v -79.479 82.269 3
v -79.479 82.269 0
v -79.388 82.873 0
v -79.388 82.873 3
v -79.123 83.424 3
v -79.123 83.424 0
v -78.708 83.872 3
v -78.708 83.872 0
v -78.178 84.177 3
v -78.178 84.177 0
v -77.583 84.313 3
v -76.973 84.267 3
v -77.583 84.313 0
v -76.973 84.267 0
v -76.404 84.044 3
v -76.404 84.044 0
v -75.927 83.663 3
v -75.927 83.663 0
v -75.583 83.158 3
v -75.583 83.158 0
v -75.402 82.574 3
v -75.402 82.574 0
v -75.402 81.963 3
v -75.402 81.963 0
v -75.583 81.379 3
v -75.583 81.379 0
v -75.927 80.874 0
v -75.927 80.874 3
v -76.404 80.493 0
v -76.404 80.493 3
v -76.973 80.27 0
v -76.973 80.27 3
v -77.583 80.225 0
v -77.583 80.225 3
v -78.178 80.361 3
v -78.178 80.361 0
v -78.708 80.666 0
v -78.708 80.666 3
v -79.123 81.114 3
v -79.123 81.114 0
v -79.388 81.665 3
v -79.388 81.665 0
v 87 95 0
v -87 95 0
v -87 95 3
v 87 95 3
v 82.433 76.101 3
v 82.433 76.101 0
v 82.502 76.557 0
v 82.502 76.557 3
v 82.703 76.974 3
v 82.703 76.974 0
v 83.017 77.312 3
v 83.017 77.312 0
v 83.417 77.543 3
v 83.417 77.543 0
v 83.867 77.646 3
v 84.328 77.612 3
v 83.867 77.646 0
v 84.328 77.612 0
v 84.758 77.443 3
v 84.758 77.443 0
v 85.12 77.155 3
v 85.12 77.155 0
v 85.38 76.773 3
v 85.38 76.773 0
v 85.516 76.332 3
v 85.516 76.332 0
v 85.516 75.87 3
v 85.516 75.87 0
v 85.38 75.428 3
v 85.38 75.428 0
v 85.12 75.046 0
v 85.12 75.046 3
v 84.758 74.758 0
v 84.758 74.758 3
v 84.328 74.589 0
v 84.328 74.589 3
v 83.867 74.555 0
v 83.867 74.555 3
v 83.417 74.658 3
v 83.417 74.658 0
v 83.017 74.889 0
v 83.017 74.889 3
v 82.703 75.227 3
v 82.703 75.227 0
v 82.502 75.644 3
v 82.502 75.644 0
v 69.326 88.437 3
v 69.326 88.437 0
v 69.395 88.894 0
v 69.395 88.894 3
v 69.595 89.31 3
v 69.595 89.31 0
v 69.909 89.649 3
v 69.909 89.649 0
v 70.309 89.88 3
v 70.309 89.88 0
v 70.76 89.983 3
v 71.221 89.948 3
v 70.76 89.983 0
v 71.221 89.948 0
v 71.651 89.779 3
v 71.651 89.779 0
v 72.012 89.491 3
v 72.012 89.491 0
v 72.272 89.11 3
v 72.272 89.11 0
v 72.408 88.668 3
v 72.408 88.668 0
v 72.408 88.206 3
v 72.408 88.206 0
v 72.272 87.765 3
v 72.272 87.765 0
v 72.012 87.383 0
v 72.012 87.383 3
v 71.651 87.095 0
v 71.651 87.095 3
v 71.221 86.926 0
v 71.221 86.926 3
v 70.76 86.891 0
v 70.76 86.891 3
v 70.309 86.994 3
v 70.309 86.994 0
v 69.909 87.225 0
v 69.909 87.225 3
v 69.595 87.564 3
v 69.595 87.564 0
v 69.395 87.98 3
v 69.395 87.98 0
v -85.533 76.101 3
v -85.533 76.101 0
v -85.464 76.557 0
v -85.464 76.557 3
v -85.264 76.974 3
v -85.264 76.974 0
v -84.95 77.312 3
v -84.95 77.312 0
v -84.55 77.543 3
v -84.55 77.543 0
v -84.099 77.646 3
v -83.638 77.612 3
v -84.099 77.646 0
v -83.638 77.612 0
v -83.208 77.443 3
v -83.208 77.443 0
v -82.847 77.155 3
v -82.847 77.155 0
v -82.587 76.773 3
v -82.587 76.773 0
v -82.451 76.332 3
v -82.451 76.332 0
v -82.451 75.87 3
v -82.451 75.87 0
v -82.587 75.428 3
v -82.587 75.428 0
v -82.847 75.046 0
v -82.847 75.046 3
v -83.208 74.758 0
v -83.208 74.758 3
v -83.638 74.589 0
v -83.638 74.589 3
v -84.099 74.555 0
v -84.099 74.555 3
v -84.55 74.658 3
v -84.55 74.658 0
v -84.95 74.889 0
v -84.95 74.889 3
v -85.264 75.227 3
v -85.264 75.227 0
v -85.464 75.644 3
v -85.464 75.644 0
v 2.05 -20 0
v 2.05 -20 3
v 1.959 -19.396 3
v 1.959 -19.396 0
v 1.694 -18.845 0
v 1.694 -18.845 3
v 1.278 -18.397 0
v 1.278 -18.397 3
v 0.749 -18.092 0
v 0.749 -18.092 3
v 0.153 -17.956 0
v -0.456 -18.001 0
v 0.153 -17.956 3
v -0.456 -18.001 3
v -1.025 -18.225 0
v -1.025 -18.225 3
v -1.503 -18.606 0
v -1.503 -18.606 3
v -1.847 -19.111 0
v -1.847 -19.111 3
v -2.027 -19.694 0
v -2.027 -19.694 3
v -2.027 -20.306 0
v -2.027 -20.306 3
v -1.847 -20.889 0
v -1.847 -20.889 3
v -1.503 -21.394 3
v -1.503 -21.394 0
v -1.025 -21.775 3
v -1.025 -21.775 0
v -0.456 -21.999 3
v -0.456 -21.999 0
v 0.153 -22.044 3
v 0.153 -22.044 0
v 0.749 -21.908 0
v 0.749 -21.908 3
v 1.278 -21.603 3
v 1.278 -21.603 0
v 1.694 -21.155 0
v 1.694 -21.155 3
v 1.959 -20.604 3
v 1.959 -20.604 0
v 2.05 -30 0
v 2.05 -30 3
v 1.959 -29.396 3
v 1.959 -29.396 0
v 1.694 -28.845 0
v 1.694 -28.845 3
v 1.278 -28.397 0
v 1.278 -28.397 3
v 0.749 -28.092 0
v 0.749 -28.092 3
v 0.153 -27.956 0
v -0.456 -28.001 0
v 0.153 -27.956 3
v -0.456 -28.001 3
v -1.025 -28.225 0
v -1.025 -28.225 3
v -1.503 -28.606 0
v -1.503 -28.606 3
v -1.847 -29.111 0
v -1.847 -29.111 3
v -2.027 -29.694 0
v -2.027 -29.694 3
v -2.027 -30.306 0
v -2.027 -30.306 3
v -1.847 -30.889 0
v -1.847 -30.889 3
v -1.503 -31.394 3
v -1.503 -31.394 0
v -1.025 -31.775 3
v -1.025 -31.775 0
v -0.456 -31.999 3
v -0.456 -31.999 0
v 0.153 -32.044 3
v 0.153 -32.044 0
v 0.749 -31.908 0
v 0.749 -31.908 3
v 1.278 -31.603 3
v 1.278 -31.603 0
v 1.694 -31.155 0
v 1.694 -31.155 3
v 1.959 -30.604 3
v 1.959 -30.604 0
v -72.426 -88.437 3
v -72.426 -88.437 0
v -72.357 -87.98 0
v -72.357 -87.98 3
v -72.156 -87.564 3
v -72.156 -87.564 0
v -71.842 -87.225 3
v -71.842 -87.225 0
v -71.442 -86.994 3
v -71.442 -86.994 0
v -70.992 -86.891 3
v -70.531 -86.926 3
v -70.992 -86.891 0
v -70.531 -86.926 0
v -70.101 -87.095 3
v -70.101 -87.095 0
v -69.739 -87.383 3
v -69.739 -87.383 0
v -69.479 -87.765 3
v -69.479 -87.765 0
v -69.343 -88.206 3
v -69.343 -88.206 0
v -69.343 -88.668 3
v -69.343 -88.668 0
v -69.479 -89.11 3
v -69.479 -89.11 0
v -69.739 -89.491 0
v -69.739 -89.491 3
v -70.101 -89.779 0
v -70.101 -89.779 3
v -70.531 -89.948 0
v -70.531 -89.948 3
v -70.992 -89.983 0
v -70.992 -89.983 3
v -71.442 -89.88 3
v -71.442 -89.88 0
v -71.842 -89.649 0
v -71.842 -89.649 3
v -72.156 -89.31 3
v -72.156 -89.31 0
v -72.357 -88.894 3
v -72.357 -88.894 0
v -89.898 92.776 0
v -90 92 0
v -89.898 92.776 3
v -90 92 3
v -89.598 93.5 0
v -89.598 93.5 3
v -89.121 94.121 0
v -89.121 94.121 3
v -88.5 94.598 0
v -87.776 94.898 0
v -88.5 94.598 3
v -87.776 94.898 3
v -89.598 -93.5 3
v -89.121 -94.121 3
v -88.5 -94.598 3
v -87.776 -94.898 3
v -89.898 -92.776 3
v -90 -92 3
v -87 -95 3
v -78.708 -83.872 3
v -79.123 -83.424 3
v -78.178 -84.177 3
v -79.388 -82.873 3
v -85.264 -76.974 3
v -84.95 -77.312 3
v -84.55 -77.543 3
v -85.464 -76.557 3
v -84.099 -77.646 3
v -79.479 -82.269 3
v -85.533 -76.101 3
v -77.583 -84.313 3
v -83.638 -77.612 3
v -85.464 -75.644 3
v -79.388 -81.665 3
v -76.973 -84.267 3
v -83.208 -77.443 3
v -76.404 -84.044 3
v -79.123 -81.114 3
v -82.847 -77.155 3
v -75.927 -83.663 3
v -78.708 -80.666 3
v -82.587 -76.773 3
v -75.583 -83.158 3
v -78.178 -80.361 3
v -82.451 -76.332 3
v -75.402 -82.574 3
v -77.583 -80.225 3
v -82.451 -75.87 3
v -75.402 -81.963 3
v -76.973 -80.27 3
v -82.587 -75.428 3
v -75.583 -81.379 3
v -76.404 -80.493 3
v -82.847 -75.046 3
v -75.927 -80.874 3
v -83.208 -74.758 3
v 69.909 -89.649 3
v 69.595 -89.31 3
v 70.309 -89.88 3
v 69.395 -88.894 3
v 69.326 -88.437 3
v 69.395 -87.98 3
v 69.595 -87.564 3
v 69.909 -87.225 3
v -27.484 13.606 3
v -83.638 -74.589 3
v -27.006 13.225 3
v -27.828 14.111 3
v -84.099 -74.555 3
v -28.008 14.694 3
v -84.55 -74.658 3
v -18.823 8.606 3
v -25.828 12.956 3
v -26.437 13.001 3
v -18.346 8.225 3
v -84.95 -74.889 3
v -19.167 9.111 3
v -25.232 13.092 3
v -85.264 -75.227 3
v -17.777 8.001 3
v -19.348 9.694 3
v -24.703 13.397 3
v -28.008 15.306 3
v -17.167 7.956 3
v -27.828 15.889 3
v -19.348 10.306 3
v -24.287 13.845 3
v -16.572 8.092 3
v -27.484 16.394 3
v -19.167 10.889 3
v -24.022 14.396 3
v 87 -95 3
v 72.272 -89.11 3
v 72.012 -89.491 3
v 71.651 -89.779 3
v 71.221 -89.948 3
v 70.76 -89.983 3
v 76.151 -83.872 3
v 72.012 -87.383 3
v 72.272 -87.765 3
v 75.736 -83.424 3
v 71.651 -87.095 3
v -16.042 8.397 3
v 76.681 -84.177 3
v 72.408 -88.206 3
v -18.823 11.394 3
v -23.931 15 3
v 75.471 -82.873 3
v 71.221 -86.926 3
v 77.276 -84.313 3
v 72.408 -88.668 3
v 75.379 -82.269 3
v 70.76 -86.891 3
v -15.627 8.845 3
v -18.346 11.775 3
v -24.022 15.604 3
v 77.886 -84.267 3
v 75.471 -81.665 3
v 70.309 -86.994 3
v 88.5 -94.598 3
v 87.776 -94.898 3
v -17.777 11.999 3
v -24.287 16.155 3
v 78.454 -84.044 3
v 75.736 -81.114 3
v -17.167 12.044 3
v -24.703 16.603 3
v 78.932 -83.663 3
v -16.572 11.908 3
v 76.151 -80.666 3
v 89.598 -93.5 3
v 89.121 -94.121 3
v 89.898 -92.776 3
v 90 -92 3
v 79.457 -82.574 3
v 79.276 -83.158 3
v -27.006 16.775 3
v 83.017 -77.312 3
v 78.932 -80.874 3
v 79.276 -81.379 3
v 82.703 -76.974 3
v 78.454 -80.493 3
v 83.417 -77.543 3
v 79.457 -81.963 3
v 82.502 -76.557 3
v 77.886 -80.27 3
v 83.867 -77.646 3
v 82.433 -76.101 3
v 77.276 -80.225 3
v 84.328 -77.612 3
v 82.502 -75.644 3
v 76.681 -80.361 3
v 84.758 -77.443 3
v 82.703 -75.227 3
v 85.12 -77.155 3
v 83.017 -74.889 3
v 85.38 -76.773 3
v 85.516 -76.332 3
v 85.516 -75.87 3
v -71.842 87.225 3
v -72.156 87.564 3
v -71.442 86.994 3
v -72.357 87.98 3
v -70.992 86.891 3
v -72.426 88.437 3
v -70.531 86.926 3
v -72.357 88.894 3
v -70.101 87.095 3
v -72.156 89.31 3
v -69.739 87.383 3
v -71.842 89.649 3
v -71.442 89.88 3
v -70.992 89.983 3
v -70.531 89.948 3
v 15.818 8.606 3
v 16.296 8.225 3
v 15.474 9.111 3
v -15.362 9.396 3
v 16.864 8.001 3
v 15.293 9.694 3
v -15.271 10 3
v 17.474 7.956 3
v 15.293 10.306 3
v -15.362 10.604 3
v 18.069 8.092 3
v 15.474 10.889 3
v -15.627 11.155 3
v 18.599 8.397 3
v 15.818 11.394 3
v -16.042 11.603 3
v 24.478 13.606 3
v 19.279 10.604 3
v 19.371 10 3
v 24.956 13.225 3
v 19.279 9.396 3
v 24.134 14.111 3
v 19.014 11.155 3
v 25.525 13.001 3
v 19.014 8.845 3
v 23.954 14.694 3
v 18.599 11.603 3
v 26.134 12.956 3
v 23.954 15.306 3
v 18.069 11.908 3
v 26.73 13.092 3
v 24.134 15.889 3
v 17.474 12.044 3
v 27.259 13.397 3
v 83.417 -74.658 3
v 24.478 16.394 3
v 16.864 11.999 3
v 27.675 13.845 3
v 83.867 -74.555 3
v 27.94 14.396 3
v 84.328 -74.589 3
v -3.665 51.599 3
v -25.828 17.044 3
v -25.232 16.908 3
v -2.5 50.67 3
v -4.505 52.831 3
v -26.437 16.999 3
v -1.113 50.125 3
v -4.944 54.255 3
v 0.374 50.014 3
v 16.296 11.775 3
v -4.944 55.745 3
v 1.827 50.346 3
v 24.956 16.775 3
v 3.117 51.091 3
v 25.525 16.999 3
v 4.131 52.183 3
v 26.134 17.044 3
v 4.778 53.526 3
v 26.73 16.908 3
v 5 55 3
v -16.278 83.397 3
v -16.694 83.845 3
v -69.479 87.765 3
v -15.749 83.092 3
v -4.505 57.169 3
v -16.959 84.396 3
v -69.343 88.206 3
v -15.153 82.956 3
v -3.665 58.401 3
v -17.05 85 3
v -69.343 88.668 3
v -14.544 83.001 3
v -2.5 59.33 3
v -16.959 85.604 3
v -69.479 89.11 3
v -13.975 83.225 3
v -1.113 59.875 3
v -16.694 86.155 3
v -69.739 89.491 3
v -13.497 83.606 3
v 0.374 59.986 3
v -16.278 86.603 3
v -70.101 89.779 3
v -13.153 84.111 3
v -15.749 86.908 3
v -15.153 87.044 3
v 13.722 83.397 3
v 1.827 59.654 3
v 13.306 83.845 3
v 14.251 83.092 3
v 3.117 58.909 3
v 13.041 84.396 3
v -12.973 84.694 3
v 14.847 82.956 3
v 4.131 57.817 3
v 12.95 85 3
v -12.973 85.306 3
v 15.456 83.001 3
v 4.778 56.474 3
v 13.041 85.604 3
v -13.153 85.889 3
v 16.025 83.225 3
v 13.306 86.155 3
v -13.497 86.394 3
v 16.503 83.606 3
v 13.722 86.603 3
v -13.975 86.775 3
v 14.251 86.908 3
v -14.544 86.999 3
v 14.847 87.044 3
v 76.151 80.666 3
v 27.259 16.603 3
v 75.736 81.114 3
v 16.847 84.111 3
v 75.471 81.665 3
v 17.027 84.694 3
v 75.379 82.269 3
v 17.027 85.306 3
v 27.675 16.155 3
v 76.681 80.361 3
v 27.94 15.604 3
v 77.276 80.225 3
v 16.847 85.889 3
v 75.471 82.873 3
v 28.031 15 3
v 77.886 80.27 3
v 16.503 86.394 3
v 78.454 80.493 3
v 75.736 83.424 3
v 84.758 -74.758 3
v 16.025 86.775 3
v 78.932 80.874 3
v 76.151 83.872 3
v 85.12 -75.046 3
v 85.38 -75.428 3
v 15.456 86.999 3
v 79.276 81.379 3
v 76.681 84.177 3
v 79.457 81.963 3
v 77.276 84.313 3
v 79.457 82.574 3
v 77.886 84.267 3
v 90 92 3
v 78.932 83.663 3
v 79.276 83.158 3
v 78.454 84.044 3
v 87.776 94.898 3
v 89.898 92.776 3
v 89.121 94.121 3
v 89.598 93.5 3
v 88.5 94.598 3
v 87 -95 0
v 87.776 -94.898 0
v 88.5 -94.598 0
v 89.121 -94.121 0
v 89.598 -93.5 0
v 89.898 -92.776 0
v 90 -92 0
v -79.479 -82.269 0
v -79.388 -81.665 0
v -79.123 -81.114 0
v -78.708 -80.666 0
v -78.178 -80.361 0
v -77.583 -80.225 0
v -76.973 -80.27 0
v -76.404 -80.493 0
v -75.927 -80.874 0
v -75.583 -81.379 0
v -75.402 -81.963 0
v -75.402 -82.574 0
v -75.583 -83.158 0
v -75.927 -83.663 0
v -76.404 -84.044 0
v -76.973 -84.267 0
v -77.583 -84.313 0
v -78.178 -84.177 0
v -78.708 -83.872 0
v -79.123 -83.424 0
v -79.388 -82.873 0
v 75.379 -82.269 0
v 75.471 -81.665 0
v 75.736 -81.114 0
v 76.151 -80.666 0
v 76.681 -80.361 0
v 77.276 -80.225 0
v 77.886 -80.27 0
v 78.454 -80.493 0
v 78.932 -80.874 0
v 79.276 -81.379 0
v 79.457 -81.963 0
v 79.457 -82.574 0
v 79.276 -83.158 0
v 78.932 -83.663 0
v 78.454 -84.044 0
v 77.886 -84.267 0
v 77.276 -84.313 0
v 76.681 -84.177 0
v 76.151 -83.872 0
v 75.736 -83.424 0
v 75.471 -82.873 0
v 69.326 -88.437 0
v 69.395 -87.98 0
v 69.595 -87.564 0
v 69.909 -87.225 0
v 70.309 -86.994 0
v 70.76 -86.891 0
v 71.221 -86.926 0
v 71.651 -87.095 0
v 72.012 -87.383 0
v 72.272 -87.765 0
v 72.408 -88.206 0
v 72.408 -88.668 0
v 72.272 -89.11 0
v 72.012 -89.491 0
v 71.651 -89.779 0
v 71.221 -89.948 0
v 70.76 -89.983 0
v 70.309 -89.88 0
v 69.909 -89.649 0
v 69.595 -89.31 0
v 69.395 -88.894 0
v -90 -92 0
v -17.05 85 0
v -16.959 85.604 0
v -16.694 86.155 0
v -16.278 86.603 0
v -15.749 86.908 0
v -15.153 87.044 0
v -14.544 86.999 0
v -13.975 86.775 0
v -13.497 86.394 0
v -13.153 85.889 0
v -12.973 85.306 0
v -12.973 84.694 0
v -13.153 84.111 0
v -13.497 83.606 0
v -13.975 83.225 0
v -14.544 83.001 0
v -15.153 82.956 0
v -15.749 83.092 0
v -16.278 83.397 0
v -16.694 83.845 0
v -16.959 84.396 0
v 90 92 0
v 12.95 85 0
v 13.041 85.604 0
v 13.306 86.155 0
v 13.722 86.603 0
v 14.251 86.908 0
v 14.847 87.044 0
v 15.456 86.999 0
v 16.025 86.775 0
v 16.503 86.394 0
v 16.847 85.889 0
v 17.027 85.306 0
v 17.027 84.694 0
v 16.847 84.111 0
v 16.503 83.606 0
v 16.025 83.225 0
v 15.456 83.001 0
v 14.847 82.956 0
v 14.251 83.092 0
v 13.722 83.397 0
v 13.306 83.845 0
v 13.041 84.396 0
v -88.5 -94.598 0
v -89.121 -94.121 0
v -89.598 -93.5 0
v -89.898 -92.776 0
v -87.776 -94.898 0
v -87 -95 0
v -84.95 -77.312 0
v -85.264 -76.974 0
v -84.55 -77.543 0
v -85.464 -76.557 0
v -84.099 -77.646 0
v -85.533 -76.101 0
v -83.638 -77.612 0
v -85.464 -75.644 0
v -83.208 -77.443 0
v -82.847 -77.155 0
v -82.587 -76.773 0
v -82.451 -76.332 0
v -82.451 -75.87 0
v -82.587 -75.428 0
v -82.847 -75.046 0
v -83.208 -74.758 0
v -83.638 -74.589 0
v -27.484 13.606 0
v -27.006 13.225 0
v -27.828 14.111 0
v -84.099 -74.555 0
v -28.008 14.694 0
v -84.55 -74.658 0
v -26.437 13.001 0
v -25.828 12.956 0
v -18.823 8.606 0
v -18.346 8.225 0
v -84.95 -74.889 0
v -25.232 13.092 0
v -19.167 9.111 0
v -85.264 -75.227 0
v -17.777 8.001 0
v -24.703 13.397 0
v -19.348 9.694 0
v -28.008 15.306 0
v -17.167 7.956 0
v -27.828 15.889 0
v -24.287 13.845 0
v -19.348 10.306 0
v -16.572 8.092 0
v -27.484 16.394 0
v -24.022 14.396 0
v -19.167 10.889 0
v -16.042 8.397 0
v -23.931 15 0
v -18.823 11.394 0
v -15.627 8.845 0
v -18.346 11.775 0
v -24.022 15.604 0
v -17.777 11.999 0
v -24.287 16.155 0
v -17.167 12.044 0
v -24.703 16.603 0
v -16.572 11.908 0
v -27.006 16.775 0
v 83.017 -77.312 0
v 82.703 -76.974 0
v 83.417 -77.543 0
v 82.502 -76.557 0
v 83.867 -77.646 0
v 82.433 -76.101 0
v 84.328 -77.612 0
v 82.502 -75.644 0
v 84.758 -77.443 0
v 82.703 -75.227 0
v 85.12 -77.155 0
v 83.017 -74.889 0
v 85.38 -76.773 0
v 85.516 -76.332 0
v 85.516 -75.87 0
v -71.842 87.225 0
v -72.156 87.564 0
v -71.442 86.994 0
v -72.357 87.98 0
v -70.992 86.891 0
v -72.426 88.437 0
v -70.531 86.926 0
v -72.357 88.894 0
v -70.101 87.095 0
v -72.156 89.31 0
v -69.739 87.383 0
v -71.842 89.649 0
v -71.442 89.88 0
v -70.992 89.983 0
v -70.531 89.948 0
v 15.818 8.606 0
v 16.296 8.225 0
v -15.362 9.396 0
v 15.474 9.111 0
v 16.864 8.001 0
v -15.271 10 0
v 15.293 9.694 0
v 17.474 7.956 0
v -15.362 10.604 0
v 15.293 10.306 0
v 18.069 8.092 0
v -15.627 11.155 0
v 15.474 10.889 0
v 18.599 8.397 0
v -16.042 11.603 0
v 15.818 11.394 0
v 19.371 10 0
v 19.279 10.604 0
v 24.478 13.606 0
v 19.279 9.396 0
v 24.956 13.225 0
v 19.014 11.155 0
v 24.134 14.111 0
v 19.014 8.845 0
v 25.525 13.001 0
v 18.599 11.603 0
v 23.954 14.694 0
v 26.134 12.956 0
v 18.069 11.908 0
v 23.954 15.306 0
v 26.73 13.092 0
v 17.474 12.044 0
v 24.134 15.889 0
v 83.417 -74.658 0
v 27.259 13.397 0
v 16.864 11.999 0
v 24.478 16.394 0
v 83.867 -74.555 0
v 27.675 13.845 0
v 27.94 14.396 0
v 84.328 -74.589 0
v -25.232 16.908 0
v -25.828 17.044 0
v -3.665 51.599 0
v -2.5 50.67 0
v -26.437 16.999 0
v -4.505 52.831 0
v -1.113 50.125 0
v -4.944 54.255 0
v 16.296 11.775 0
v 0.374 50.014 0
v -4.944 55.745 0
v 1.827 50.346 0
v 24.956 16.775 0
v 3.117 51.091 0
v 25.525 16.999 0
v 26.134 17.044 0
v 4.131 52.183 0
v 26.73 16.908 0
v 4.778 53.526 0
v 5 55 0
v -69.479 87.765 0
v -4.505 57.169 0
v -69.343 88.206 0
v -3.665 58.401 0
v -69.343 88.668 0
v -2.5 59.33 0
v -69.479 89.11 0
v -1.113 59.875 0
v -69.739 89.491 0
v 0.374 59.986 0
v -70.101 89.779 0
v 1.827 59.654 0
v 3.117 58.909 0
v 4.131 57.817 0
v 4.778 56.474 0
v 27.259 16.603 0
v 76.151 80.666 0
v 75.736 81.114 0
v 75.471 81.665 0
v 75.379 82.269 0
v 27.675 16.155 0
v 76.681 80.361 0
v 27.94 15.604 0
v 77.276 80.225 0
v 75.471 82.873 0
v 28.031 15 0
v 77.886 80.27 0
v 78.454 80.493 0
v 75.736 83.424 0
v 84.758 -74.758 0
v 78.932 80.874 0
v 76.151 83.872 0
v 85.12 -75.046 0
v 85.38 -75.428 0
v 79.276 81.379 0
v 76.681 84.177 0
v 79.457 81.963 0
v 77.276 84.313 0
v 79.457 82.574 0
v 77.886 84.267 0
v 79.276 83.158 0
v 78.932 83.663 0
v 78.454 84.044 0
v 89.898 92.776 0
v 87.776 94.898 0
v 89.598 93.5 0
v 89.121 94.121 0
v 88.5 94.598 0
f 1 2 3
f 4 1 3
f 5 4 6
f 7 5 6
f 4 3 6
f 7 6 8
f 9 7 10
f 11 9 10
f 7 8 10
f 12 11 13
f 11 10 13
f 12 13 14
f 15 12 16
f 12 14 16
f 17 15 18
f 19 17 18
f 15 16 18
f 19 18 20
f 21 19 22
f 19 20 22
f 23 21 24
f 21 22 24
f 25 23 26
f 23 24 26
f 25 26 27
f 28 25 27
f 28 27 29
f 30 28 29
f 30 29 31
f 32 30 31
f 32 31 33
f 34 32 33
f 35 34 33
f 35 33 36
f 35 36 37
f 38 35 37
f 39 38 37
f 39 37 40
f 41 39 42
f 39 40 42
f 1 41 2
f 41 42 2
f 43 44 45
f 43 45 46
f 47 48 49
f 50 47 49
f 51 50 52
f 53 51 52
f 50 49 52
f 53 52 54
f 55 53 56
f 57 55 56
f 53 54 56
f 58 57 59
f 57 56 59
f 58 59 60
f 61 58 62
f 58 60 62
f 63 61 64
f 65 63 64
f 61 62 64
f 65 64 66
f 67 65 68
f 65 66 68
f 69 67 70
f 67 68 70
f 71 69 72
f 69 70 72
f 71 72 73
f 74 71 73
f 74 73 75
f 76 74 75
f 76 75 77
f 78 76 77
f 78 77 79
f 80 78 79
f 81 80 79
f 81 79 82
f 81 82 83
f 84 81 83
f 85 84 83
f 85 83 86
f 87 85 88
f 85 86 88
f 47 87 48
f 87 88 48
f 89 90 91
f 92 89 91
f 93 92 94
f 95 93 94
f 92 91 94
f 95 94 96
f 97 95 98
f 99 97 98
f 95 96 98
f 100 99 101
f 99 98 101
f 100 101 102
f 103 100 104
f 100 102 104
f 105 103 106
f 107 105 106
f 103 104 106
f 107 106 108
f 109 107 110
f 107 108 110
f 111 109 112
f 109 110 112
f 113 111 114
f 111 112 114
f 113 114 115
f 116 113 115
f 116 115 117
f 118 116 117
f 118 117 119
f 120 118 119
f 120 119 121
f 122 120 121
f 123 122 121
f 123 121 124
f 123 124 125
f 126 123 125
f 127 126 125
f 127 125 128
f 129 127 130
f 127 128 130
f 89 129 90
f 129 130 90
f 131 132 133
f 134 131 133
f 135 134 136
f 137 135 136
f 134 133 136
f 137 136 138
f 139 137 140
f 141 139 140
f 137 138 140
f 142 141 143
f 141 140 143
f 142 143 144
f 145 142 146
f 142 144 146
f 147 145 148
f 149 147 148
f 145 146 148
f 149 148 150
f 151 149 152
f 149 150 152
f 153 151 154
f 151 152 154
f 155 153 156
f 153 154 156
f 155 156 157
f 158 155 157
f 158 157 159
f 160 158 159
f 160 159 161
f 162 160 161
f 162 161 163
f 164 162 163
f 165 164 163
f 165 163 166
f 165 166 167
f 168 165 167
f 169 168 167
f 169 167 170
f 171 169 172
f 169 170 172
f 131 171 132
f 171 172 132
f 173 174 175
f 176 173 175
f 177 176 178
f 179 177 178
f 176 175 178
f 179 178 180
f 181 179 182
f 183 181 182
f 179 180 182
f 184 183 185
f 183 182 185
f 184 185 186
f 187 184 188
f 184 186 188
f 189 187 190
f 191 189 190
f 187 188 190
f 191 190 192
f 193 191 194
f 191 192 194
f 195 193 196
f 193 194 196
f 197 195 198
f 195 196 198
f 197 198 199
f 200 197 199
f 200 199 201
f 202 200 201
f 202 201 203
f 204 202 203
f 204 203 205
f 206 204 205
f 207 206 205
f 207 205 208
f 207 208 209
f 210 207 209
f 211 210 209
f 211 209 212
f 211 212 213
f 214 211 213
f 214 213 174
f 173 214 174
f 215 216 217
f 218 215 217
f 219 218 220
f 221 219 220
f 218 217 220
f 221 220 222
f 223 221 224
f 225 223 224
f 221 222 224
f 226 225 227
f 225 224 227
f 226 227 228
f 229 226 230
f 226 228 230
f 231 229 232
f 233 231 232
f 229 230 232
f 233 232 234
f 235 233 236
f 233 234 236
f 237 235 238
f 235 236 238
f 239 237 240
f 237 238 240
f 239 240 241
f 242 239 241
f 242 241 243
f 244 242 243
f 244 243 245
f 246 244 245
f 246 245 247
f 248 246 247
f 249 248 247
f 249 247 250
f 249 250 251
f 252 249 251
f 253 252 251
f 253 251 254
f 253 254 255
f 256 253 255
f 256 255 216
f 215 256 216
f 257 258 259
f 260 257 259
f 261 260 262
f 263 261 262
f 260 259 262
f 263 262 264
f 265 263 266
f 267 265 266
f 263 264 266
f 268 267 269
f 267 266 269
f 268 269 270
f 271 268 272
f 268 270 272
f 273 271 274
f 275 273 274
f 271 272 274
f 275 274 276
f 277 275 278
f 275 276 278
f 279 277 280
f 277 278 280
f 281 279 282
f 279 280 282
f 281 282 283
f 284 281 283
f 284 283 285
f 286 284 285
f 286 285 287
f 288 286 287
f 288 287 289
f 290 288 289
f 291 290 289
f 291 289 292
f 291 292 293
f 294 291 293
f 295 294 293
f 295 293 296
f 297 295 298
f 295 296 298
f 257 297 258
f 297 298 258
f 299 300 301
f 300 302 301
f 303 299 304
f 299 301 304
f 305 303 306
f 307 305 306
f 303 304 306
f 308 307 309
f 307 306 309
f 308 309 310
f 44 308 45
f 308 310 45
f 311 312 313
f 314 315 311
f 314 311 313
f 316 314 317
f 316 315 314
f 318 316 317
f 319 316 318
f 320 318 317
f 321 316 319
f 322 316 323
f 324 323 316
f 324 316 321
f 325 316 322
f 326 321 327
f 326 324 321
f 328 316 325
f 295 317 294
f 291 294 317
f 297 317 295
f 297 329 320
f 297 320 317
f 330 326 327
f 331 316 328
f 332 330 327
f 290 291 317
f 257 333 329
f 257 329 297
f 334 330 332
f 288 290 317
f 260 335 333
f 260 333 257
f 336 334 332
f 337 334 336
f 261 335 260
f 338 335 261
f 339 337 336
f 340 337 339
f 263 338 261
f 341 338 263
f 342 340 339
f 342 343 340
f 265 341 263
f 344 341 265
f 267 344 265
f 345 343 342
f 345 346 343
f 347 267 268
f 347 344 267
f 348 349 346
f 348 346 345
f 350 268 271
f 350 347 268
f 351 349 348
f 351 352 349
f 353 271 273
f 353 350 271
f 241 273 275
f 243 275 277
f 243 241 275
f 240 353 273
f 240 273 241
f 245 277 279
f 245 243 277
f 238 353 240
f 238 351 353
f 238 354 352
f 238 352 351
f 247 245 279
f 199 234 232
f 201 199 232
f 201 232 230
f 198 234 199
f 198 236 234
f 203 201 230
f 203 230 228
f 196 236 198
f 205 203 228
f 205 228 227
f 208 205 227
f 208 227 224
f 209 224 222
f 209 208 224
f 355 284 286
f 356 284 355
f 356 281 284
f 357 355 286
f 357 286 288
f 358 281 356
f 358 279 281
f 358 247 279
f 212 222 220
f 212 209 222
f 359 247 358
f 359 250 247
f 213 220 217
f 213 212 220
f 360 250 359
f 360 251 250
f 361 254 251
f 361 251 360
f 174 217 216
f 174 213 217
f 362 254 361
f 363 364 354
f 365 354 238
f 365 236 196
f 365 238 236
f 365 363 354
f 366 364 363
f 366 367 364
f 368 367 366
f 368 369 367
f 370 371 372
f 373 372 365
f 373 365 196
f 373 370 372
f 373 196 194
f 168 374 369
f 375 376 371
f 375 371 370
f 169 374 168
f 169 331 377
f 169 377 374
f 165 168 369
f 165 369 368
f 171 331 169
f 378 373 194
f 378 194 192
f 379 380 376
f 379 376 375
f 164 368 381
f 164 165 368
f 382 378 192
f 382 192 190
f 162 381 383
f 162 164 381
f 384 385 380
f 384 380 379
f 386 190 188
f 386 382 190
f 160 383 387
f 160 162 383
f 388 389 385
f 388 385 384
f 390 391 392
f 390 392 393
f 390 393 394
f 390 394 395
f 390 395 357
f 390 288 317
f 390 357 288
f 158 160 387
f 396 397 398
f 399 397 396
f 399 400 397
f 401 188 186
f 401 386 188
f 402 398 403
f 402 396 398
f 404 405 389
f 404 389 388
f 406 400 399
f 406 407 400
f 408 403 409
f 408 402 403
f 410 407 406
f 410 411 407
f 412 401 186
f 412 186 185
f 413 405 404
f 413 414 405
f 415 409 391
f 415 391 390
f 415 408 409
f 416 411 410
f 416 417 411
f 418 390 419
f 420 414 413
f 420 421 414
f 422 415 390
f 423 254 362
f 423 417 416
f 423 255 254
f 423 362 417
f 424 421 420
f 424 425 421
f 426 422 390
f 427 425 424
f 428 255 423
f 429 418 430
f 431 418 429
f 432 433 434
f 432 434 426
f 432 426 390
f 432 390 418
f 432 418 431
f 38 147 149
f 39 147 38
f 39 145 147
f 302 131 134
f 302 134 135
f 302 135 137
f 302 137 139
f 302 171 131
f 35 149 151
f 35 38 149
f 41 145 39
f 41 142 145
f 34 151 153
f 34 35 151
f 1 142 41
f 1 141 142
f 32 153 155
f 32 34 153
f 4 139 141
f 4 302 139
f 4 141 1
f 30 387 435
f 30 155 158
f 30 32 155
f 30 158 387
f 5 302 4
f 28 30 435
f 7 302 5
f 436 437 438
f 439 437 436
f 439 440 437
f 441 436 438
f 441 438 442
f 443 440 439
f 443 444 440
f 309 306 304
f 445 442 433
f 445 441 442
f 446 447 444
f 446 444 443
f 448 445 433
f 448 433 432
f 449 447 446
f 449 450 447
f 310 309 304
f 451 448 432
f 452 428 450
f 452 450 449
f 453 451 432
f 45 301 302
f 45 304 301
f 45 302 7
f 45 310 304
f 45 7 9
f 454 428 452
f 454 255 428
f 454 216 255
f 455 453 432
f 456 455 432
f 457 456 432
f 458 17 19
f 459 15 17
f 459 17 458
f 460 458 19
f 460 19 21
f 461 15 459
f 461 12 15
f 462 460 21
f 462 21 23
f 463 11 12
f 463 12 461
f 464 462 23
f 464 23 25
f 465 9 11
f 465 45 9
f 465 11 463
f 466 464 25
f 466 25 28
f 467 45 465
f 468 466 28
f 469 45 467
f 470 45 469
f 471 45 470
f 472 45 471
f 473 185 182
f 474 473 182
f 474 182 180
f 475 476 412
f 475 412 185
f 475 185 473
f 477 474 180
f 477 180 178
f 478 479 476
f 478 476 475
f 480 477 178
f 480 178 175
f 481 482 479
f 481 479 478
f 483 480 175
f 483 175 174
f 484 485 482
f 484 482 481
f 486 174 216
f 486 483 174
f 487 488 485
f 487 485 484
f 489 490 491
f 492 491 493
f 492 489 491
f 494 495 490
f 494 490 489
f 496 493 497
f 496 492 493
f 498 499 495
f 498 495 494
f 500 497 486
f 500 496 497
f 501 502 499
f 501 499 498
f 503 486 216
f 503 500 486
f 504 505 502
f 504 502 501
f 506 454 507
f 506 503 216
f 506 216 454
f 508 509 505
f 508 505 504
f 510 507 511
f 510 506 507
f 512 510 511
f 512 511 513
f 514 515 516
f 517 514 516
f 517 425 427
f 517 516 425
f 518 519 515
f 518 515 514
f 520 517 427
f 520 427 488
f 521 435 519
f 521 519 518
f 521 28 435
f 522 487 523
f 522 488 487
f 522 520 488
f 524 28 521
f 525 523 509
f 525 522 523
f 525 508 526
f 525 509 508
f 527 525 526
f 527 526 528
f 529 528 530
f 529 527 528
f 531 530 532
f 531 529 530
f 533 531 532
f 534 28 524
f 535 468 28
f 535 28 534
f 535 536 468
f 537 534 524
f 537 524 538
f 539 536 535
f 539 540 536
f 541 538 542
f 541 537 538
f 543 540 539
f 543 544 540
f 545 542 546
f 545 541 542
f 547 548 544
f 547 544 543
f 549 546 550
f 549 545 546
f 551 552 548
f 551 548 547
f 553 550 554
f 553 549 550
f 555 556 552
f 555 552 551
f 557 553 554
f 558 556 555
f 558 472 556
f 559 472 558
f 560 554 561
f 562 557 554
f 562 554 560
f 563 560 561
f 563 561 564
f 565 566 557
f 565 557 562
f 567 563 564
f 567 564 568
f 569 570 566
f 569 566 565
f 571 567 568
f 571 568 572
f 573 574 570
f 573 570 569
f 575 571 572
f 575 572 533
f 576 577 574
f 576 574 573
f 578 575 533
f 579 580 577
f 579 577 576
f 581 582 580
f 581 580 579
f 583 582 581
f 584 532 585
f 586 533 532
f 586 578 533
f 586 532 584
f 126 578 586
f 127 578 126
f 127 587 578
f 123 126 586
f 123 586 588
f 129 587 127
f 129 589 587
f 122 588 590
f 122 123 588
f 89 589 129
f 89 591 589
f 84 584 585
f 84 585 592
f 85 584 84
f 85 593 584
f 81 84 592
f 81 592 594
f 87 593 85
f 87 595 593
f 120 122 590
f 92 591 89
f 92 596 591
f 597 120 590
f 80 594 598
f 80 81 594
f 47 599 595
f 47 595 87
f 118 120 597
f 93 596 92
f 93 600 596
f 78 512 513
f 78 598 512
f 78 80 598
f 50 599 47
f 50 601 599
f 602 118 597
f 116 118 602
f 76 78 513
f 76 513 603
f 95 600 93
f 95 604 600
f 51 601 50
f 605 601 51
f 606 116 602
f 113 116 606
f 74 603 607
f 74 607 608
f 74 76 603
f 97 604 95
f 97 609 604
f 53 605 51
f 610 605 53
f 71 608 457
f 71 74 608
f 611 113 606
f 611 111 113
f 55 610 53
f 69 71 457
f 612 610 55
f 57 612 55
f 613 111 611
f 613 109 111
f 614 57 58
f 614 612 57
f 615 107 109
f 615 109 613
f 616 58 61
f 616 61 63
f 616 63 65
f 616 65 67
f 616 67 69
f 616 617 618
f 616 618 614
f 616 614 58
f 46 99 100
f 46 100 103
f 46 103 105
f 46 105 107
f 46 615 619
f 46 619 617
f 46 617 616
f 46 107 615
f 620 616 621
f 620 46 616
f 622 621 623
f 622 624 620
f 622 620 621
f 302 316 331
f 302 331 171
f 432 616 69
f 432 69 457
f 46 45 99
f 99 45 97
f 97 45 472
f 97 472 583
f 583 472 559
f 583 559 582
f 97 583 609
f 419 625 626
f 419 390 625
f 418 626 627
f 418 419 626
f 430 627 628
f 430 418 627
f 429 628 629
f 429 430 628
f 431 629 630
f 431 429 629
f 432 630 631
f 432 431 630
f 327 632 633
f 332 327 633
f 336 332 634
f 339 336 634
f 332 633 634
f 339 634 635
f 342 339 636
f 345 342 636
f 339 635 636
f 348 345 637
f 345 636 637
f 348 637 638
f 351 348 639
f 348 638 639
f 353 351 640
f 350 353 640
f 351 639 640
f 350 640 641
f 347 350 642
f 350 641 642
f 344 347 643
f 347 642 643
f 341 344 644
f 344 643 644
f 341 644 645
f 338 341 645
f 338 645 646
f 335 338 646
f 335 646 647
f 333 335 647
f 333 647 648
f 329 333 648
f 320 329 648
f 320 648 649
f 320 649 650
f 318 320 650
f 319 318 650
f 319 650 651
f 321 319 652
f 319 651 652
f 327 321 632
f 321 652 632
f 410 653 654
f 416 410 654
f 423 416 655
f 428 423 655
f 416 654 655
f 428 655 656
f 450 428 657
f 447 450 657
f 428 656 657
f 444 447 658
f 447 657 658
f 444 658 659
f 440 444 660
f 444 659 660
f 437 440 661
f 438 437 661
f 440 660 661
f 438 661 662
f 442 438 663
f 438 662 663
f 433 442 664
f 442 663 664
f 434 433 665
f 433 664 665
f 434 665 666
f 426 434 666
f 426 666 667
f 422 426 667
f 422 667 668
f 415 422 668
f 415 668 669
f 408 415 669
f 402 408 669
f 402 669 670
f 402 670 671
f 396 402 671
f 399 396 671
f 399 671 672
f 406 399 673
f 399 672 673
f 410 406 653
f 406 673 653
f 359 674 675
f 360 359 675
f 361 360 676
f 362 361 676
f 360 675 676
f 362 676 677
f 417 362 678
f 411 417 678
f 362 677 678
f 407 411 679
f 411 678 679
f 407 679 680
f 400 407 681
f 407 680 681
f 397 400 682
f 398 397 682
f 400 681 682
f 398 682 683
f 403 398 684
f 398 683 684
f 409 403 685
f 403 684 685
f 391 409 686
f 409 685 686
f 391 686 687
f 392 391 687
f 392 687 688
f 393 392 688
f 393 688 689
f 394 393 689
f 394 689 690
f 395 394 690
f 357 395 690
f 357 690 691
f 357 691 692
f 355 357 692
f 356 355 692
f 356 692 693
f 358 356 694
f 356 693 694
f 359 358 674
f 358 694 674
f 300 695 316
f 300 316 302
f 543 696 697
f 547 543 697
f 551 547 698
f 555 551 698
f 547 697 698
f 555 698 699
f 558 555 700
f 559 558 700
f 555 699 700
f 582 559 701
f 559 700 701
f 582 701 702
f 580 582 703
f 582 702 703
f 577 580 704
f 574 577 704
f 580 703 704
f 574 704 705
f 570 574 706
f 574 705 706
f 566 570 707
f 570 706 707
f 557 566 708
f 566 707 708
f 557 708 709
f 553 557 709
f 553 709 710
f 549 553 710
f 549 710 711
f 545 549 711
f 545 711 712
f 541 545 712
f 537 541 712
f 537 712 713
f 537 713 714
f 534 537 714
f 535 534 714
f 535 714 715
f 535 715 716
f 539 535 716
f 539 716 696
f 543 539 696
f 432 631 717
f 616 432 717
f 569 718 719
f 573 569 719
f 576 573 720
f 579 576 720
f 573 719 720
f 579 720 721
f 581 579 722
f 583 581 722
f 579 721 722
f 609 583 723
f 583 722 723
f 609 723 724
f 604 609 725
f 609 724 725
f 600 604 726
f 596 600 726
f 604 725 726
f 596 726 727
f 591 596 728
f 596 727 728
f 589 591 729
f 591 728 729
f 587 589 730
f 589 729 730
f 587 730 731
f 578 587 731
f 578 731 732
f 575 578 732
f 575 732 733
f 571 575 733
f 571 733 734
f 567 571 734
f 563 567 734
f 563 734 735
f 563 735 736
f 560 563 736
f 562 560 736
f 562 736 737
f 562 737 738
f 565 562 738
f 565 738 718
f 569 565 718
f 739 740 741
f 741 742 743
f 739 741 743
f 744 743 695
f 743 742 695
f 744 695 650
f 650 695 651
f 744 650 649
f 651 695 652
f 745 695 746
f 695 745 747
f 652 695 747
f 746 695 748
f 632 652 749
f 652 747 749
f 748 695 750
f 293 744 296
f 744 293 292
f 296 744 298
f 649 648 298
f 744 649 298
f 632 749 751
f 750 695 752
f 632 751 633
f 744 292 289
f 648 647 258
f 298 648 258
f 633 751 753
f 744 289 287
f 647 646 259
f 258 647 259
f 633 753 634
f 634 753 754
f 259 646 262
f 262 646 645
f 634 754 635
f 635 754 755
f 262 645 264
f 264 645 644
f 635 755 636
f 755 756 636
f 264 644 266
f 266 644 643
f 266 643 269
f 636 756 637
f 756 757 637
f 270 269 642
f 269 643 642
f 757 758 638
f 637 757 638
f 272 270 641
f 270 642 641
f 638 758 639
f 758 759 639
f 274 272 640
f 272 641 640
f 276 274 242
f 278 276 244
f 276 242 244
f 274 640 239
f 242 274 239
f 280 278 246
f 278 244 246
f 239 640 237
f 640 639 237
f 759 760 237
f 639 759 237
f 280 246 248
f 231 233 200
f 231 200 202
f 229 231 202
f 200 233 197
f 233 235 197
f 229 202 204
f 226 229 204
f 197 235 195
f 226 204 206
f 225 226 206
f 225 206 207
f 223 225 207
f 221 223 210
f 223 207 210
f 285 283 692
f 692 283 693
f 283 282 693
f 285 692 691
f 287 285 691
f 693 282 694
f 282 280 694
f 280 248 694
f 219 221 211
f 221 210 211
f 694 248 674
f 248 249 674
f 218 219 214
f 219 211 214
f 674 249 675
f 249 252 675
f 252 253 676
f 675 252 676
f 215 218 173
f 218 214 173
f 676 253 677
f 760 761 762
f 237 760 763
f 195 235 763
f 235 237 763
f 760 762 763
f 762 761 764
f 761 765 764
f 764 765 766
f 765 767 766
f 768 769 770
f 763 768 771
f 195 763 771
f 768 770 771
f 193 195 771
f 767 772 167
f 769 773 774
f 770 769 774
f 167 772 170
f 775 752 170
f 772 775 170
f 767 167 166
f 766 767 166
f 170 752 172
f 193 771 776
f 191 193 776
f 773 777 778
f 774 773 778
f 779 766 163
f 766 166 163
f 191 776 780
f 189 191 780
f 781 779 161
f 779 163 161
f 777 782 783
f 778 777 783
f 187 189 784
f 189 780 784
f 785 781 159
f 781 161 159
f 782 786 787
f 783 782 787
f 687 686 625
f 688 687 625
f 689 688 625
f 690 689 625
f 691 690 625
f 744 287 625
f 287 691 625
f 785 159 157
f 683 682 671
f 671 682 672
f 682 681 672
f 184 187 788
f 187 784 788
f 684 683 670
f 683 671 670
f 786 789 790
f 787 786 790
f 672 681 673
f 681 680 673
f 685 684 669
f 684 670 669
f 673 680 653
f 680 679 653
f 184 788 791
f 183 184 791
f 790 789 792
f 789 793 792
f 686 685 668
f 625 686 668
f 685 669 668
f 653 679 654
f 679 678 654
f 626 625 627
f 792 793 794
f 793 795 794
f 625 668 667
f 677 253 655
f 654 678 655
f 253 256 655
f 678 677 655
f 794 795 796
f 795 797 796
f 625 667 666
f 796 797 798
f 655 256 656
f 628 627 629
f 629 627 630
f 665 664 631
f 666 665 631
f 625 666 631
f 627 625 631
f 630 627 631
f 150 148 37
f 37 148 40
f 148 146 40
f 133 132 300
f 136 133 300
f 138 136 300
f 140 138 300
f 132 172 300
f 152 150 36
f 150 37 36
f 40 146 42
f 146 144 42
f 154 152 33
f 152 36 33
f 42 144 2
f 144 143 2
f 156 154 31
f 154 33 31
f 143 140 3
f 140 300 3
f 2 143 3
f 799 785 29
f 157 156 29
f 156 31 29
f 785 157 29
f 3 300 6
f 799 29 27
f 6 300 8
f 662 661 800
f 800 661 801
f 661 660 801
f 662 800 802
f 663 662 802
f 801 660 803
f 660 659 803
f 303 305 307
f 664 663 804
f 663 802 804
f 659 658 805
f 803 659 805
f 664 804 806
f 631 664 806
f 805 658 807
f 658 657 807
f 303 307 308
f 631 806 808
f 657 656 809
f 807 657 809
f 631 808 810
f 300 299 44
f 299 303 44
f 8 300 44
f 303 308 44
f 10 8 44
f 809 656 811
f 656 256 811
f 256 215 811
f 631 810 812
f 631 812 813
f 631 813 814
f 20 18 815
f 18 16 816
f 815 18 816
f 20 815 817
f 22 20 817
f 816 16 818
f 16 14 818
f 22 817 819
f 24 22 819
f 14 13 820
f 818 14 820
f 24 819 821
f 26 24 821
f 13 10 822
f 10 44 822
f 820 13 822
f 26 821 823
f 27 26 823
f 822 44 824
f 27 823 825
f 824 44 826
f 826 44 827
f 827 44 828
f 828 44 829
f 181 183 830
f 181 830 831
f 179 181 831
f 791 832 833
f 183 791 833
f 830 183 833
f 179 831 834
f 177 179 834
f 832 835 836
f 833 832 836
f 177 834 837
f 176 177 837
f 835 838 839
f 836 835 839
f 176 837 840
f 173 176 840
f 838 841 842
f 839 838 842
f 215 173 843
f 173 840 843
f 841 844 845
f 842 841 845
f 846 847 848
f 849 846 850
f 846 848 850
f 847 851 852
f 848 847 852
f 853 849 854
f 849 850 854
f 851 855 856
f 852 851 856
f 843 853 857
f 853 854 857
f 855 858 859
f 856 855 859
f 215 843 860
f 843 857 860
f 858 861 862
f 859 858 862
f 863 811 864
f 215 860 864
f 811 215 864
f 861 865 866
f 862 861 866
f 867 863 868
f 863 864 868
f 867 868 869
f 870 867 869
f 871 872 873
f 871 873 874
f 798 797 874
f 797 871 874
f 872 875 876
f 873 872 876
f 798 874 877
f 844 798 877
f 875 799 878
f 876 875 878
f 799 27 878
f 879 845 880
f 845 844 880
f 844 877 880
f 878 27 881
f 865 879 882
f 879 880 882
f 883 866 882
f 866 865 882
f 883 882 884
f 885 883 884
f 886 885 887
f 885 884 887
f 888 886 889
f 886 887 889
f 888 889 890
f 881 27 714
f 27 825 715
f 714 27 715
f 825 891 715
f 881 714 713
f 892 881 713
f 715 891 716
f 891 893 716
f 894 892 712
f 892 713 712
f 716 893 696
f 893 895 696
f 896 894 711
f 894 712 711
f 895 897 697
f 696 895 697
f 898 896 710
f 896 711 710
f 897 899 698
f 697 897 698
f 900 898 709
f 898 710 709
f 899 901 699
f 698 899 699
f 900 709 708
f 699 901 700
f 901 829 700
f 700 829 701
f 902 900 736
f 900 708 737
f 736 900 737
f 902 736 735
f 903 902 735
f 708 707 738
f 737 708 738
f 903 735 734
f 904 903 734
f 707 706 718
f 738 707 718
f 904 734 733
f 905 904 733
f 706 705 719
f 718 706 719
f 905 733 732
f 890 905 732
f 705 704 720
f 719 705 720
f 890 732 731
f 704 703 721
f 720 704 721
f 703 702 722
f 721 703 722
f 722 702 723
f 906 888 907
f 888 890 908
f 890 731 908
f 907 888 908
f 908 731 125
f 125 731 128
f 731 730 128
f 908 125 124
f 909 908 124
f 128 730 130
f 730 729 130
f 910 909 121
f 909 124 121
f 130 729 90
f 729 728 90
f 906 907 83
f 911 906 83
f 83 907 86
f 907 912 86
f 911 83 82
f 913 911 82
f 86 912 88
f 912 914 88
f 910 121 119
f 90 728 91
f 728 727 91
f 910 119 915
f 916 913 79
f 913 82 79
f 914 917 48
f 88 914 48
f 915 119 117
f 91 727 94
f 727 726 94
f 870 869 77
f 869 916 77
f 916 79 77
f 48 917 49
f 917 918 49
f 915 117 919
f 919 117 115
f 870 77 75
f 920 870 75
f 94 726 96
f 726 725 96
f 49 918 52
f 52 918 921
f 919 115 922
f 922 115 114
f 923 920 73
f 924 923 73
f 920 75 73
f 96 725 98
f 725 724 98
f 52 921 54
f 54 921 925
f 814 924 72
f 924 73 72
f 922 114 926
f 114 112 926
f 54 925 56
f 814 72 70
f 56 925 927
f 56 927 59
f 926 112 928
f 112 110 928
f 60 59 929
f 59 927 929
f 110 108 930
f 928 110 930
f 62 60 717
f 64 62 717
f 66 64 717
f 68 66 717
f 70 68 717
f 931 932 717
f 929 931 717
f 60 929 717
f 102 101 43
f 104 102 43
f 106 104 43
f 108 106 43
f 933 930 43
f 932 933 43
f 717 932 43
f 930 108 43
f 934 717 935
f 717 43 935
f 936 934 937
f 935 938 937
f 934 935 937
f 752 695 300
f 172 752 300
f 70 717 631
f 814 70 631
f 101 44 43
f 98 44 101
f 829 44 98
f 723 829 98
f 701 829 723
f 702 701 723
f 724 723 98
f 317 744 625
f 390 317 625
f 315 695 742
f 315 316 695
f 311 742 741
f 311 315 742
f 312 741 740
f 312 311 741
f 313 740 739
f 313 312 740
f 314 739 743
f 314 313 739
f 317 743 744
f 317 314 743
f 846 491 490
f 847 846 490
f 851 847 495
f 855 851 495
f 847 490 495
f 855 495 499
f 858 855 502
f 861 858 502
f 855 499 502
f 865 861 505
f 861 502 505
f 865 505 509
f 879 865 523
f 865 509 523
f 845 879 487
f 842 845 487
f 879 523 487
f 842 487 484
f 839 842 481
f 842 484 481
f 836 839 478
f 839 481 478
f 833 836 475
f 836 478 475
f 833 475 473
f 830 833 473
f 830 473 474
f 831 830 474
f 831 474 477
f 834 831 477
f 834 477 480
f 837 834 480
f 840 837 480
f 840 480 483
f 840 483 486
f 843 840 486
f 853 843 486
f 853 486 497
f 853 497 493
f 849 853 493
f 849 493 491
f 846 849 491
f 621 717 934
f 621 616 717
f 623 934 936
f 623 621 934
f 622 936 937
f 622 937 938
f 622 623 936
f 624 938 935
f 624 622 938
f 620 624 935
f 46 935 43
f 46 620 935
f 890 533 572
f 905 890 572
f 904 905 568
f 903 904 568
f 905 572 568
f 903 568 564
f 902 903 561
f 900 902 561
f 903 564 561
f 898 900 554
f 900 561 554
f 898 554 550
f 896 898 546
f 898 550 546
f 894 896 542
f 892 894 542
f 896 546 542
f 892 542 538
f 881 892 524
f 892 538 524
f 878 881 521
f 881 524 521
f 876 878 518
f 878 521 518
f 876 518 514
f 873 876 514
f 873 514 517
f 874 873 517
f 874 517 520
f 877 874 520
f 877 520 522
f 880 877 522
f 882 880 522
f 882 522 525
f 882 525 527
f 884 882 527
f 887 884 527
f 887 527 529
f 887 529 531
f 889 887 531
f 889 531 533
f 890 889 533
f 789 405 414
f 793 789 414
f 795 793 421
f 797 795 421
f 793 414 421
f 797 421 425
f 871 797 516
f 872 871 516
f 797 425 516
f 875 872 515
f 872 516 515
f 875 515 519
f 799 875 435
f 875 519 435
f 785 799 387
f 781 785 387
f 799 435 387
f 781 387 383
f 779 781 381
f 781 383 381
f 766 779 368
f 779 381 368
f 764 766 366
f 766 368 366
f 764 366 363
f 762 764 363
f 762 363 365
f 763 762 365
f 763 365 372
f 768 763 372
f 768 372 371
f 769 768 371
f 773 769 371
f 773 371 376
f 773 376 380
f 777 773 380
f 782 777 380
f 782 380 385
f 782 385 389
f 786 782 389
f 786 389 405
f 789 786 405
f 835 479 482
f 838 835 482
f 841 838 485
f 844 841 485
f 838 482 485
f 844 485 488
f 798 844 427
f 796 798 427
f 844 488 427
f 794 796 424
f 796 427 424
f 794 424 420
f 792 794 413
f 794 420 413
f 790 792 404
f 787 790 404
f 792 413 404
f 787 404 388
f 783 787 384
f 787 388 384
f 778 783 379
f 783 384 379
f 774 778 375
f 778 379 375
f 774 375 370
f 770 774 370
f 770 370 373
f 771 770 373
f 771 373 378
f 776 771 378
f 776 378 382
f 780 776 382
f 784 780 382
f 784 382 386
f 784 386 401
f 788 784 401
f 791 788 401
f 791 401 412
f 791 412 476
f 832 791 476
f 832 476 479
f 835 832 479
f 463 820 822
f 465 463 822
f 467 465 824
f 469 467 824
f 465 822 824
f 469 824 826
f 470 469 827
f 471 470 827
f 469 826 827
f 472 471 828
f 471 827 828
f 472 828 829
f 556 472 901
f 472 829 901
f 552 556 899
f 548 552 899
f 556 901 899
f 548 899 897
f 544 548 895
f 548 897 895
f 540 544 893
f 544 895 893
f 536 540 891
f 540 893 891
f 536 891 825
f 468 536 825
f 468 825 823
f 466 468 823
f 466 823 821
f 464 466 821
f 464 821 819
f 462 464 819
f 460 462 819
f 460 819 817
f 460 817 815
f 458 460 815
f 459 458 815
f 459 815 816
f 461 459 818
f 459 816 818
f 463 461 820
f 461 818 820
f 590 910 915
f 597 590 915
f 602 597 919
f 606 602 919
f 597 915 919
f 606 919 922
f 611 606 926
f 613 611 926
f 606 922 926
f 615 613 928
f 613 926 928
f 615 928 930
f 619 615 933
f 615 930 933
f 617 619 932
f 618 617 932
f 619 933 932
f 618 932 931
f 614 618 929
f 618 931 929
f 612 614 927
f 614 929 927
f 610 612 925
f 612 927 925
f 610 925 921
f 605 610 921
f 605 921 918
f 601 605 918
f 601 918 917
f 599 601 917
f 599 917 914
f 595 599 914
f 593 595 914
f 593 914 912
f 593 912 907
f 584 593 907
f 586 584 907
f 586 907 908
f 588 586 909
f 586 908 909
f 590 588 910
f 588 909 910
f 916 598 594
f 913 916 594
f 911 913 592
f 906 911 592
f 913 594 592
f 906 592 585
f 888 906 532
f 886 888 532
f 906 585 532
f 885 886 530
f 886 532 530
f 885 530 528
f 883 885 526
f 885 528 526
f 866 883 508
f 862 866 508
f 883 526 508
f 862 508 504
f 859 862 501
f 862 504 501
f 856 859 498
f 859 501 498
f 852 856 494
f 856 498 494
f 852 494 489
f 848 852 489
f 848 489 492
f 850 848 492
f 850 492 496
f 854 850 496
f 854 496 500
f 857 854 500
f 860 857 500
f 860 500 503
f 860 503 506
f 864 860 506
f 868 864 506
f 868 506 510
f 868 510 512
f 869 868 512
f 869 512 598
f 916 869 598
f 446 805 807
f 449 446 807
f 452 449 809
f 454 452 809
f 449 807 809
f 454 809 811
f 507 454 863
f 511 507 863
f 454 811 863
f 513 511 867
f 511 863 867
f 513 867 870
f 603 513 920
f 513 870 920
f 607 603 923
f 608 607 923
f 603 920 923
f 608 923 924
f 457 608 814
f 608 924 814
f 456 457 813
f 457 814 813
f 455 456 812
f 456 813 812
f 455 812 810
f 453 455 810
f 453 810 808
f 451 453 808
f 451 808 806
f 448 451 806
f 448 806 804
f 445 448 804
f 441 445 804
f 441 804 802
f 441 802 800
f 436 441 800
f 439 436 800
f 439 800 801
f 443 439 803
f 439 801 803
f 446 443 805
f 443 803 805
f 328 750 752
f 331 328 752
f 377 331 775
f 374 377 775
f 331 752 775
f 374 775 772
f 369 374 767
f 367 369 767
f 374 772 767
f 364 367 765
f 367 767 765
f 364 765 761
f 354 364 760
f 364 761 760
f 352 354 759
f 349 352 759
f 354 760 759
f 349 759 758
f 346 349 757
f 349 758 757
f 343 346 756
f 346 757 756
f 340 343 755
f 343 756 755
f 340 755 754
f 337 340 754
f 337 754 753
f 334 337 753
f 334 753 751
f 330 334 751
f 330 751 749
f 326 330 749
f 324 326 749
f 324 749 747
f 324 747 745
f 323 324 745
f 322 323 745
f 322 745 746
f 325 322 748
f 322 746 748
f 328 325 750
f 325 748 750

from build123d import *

# Parameters (mm, degrees)
SKETCH1_W           = 180
SKETCH1_H           = 190
BOSS_EXTRUDE1_DEPTH = 3
FILLET1_R           = 3
SKETCH2_R           = 2.05
SKETCH2_R_2         = 1.55
CUT_EXTRUDE1_DEPTH  = 3
CUT_EXTRUDE_1_REACH = 132.897
SKETCH_2_R          = 2.05
CUT_EXTRUDE_2_REACH = 132.897
SKETCH_3_R          = 2.05
CUT_EXTRUDE_3_REACH = 132.897
SKETCH_4_R          = 5


with BuildPart() as part:
    # Sketch1 → Boss-Extrude1 (new body)
    with BuildSketch(Plane.XY):
        Rectangle(SKETCH1_W, SKETCH1_H)
    extrude(amount=BOSS_EXTRUDE1_DEPTH)

    # Fillet1
    fillet1_edges = [part.edges().sort_by_distance(p)[0] for p in [
        (90, -95, 1.5),
        (-90, -95, 1.5),
        (-90, 95, 1.5),
        (90, 95, 1.5),
    ]]
    fillet(fillet1_edges, radius=FILLET1_R)

    # Sketch2 → Cut-Extrude1 (cut)
    with BuildSketch(Plane(origin=(0, 0, 0), x_dir=(-1, 0, 0), z_dir=(0, 0, -1))):
        with Locations((-77.42949016, 82.268833295)):
            Circle(SKETCH2_R)
        with Locations((77.42949016, 82.268833295)):
            Circle(SKETCH2_R)
        with Locations((-77.42949016, -82.268833295)):
            Circle(SKETCH2_R)
        with Locations((77.42949016, -82.268833295)):
            Circle(SKETCH2_R)
        with Locations((-70.875690226, 88.437115586)):
            Circle(SKETCH2_R_2)
        with Locations((-83.983290094, 76.100551004)):
            Circle(SKETCH2_R_2)
        with Locations((70.875690226, 88.437115586)):
            Circle(SKETCH2_R_2)
        with Locations((83.983290094, 76.100551004)):
            Circle(SKETCH2_R_2)
        with Locations((-83.983290094, -76.100551004)):
            Circle(SKETCH2_R_2)
        with Locations((-70.875690226, -88.437115586)):
            Circle(SKETCH2_R_2)
        with Locations((83.983290094, -76.100551004)):
            Circle(SKETCH2_R_2)
        with Locations((70.875690226, -88.437115586)):
            Circle(SKETCH2_R_2)
    extrude(amount=-CUT_EXTRUDE1_DEPTH, mode=Mode.SUBTRACT)

    # 草图2 → 切除-拉伸1 (cut, up to next)
    with BuildSketch(Plane.XY.offset(3), mode=Mode.PRIVATE) as cut_extrude_1_sk1:
        with Locations((0, -20)):
            Circle(SKETCH_2_R)
    cut_extrude_1_tool1 = extrude(cut_extrude_1_sk1.sketch, amount=-CUT_EXTRUDE_1_REACH, mode=Mode.PRIVATE) & part.part
    # 草图2 → 切除-拉伸1 (cut, up to next)
    with BuildSketch(Plane.XY.offset(3), mode=Mode.PRIVATE) as cut_extrude_1_sk2:
        with Locations((0, -30)):
            Circle(SKETCH_2_R)
    cut_extrude_1_tool2 = extrude(cut_extrude_1_sk2.sketch, amount=-CUT_EXTRUDE_1_REACH, mode=Mode.PRIVATE) & part.part
    # 草图2 → 切除-拉伸1 (cut, up to next)
    with BuildSketch(Plane.XY.offset(3), mode=Mode.PRIVATE) as cut_extrude_1_sk3:
        with Locations((-17.320508076, 10)):
            Circle(SKETCH_2_R)
    cut_extrude_1_tool3 = extrude(cut_extrude_1_sk3.sketch, amount=-CUT_EXTRUDE_1_REACH, mode=Mode.PRIVATE) & part.part
    # 草图2 → 切除-拉伸1 (cut, up to next)
    with BuildSketch(Plane.XY.offset(3), mode=Mode.PRIVATE) as cut_extrude_1_sk4:
        with Locations((-25.980762114, 15)):
            Circle(SKETCH_2_R)
    cut_extrude_1_tool4 = extrude(cut_extrude_1_sk4.sketch, amount=-CUT_EXTRUDE_1_REACH, mode=Mode.PRIVATE) & part.part
    # 草图2 → 切除-拉伸1 (cut, up to next)
    with BuildSketch(Plane.XY.offset(3), mode=Mode.PRIVATE) as cut_extrude_1_sk5:
        with Locations((17.320508076, 10)):
            Circle(SKETCH_2_R)
    cut_extrude_1_tool5 = extrude(cut_extrude_1_sk5.sketch, amount=-CUT_EXTRUDE_1_REACH, mode=Mode.PRIVATE) & part.part
    # 草图2 → 切除-拉伸1 (cut, up to next)
    with BuildSketch(Plane.XY.offset(3), mode=Mode.PRIVATE) as cut_extrude_1_sk6:
        with Locations((25.980762114, 15)):
            Circle(SKETCH_2_R)
    cut_extrude_1_tool6 = extrude(cut_extrude_1_sk6.sketch, amount=-CUT_EXTRUDE_1_REACH, mode=Mode.PRIVATE) & part.part
    add(cut_extrude_1_tool1.solids().sort_by_distance((0, -20, 3))[0], mode=Mode.SUBTRACT)
    add(cut_extrude_1_tool2.solids().sort_by_distance((0, -30, 3))[0], mode=Mode.SUBTRACT)
    add(cut_extrude_1_tool3.solids().sort_by_distance((-17.320508, 10, 3))[0], mode=Mode.SUBTRACT)
    add(cut_extrude_1_tool4.solids().sort_by_distance((-25.980762, 15, 3))[0], mode=Mode.SUBTRACT)
    add(cut_extrude_1_tool5.solids().sort_by_distance((17.320508, 10, 3))[0], mode=Mode.SUBTRACT)
    add(cut_extrude_1_tool6.solids().sort_by_distance((25.980762, 15, 3))[0], mode=Mode.SUBTRACT)

    # 草图3 → 切除-拉伸2 (cut, up to next)
    with BuildSketch(Plane(origin=(0, 0, 0), x_dir=(-1, 0, 0), z_dir=(0, 0, -1)), mode=Mode.PRIVATE) as cut_extrude_2_sk1:
        with Locations((-15, 85)):
            Circle(SKETCH_3_R)
    cut_extrude_2_tool1 = extrude(cut_extrude_2_sk1.sketch, amount=-CUT_EXTRUDE_2_REACH, mode=Mode.PRIVATE) & part.part
    # 草图3 → 切除-拉伸2 (cut, up to next)
    with BuildSketch(Plane(origin=(0, 0, 0), x_dir=(-1, 0, 0), z_dir=(0, 0, -1)), mode=Mode.PRIVATE) as cut_extrude_2_sk2:
        with Locations((15, 85)):
            Circle(SKETCH_3_R)
    cut_extrude_2_tool2 = extrude(cut_extrude_2_sk2.sketch, amount=-CUT_EXTRUDE_2_REACH, mode=Mode.PRIVATE) & part.part
    add(cut_extrude_2_tool1.solids().sort_by_distance((15, 85, 0))[0], mode=Mode.SUBTRACT)
    add(cut_extrude_2_tool2.solids().sort_by_distance((-15, 85, 0))[0], mode=Mode.SUBTRACT)

    # 草图4 → 切除-拉伸3 (cut, up to next)
    with BuildSketch(Plane.XY.offset(3), mode=Mode.PRIVATE) as cut_extrude_3_sk1:
        with Locations((0, 55)):
            Circle(SKETCH_4_R)
    cut_extrude_3_tool1 = extrude(cut_extrude_3_sk1.sketch, amount=-CUT_EXTRUDE_3_REACH, mode=Mode.PRIVATE) & part.part
    add(cut_extrude_3_tool1.solids().sort_by_distance((0, 55, 3))[0], mode=Mode.SUBTRACT)


solid = part.part
